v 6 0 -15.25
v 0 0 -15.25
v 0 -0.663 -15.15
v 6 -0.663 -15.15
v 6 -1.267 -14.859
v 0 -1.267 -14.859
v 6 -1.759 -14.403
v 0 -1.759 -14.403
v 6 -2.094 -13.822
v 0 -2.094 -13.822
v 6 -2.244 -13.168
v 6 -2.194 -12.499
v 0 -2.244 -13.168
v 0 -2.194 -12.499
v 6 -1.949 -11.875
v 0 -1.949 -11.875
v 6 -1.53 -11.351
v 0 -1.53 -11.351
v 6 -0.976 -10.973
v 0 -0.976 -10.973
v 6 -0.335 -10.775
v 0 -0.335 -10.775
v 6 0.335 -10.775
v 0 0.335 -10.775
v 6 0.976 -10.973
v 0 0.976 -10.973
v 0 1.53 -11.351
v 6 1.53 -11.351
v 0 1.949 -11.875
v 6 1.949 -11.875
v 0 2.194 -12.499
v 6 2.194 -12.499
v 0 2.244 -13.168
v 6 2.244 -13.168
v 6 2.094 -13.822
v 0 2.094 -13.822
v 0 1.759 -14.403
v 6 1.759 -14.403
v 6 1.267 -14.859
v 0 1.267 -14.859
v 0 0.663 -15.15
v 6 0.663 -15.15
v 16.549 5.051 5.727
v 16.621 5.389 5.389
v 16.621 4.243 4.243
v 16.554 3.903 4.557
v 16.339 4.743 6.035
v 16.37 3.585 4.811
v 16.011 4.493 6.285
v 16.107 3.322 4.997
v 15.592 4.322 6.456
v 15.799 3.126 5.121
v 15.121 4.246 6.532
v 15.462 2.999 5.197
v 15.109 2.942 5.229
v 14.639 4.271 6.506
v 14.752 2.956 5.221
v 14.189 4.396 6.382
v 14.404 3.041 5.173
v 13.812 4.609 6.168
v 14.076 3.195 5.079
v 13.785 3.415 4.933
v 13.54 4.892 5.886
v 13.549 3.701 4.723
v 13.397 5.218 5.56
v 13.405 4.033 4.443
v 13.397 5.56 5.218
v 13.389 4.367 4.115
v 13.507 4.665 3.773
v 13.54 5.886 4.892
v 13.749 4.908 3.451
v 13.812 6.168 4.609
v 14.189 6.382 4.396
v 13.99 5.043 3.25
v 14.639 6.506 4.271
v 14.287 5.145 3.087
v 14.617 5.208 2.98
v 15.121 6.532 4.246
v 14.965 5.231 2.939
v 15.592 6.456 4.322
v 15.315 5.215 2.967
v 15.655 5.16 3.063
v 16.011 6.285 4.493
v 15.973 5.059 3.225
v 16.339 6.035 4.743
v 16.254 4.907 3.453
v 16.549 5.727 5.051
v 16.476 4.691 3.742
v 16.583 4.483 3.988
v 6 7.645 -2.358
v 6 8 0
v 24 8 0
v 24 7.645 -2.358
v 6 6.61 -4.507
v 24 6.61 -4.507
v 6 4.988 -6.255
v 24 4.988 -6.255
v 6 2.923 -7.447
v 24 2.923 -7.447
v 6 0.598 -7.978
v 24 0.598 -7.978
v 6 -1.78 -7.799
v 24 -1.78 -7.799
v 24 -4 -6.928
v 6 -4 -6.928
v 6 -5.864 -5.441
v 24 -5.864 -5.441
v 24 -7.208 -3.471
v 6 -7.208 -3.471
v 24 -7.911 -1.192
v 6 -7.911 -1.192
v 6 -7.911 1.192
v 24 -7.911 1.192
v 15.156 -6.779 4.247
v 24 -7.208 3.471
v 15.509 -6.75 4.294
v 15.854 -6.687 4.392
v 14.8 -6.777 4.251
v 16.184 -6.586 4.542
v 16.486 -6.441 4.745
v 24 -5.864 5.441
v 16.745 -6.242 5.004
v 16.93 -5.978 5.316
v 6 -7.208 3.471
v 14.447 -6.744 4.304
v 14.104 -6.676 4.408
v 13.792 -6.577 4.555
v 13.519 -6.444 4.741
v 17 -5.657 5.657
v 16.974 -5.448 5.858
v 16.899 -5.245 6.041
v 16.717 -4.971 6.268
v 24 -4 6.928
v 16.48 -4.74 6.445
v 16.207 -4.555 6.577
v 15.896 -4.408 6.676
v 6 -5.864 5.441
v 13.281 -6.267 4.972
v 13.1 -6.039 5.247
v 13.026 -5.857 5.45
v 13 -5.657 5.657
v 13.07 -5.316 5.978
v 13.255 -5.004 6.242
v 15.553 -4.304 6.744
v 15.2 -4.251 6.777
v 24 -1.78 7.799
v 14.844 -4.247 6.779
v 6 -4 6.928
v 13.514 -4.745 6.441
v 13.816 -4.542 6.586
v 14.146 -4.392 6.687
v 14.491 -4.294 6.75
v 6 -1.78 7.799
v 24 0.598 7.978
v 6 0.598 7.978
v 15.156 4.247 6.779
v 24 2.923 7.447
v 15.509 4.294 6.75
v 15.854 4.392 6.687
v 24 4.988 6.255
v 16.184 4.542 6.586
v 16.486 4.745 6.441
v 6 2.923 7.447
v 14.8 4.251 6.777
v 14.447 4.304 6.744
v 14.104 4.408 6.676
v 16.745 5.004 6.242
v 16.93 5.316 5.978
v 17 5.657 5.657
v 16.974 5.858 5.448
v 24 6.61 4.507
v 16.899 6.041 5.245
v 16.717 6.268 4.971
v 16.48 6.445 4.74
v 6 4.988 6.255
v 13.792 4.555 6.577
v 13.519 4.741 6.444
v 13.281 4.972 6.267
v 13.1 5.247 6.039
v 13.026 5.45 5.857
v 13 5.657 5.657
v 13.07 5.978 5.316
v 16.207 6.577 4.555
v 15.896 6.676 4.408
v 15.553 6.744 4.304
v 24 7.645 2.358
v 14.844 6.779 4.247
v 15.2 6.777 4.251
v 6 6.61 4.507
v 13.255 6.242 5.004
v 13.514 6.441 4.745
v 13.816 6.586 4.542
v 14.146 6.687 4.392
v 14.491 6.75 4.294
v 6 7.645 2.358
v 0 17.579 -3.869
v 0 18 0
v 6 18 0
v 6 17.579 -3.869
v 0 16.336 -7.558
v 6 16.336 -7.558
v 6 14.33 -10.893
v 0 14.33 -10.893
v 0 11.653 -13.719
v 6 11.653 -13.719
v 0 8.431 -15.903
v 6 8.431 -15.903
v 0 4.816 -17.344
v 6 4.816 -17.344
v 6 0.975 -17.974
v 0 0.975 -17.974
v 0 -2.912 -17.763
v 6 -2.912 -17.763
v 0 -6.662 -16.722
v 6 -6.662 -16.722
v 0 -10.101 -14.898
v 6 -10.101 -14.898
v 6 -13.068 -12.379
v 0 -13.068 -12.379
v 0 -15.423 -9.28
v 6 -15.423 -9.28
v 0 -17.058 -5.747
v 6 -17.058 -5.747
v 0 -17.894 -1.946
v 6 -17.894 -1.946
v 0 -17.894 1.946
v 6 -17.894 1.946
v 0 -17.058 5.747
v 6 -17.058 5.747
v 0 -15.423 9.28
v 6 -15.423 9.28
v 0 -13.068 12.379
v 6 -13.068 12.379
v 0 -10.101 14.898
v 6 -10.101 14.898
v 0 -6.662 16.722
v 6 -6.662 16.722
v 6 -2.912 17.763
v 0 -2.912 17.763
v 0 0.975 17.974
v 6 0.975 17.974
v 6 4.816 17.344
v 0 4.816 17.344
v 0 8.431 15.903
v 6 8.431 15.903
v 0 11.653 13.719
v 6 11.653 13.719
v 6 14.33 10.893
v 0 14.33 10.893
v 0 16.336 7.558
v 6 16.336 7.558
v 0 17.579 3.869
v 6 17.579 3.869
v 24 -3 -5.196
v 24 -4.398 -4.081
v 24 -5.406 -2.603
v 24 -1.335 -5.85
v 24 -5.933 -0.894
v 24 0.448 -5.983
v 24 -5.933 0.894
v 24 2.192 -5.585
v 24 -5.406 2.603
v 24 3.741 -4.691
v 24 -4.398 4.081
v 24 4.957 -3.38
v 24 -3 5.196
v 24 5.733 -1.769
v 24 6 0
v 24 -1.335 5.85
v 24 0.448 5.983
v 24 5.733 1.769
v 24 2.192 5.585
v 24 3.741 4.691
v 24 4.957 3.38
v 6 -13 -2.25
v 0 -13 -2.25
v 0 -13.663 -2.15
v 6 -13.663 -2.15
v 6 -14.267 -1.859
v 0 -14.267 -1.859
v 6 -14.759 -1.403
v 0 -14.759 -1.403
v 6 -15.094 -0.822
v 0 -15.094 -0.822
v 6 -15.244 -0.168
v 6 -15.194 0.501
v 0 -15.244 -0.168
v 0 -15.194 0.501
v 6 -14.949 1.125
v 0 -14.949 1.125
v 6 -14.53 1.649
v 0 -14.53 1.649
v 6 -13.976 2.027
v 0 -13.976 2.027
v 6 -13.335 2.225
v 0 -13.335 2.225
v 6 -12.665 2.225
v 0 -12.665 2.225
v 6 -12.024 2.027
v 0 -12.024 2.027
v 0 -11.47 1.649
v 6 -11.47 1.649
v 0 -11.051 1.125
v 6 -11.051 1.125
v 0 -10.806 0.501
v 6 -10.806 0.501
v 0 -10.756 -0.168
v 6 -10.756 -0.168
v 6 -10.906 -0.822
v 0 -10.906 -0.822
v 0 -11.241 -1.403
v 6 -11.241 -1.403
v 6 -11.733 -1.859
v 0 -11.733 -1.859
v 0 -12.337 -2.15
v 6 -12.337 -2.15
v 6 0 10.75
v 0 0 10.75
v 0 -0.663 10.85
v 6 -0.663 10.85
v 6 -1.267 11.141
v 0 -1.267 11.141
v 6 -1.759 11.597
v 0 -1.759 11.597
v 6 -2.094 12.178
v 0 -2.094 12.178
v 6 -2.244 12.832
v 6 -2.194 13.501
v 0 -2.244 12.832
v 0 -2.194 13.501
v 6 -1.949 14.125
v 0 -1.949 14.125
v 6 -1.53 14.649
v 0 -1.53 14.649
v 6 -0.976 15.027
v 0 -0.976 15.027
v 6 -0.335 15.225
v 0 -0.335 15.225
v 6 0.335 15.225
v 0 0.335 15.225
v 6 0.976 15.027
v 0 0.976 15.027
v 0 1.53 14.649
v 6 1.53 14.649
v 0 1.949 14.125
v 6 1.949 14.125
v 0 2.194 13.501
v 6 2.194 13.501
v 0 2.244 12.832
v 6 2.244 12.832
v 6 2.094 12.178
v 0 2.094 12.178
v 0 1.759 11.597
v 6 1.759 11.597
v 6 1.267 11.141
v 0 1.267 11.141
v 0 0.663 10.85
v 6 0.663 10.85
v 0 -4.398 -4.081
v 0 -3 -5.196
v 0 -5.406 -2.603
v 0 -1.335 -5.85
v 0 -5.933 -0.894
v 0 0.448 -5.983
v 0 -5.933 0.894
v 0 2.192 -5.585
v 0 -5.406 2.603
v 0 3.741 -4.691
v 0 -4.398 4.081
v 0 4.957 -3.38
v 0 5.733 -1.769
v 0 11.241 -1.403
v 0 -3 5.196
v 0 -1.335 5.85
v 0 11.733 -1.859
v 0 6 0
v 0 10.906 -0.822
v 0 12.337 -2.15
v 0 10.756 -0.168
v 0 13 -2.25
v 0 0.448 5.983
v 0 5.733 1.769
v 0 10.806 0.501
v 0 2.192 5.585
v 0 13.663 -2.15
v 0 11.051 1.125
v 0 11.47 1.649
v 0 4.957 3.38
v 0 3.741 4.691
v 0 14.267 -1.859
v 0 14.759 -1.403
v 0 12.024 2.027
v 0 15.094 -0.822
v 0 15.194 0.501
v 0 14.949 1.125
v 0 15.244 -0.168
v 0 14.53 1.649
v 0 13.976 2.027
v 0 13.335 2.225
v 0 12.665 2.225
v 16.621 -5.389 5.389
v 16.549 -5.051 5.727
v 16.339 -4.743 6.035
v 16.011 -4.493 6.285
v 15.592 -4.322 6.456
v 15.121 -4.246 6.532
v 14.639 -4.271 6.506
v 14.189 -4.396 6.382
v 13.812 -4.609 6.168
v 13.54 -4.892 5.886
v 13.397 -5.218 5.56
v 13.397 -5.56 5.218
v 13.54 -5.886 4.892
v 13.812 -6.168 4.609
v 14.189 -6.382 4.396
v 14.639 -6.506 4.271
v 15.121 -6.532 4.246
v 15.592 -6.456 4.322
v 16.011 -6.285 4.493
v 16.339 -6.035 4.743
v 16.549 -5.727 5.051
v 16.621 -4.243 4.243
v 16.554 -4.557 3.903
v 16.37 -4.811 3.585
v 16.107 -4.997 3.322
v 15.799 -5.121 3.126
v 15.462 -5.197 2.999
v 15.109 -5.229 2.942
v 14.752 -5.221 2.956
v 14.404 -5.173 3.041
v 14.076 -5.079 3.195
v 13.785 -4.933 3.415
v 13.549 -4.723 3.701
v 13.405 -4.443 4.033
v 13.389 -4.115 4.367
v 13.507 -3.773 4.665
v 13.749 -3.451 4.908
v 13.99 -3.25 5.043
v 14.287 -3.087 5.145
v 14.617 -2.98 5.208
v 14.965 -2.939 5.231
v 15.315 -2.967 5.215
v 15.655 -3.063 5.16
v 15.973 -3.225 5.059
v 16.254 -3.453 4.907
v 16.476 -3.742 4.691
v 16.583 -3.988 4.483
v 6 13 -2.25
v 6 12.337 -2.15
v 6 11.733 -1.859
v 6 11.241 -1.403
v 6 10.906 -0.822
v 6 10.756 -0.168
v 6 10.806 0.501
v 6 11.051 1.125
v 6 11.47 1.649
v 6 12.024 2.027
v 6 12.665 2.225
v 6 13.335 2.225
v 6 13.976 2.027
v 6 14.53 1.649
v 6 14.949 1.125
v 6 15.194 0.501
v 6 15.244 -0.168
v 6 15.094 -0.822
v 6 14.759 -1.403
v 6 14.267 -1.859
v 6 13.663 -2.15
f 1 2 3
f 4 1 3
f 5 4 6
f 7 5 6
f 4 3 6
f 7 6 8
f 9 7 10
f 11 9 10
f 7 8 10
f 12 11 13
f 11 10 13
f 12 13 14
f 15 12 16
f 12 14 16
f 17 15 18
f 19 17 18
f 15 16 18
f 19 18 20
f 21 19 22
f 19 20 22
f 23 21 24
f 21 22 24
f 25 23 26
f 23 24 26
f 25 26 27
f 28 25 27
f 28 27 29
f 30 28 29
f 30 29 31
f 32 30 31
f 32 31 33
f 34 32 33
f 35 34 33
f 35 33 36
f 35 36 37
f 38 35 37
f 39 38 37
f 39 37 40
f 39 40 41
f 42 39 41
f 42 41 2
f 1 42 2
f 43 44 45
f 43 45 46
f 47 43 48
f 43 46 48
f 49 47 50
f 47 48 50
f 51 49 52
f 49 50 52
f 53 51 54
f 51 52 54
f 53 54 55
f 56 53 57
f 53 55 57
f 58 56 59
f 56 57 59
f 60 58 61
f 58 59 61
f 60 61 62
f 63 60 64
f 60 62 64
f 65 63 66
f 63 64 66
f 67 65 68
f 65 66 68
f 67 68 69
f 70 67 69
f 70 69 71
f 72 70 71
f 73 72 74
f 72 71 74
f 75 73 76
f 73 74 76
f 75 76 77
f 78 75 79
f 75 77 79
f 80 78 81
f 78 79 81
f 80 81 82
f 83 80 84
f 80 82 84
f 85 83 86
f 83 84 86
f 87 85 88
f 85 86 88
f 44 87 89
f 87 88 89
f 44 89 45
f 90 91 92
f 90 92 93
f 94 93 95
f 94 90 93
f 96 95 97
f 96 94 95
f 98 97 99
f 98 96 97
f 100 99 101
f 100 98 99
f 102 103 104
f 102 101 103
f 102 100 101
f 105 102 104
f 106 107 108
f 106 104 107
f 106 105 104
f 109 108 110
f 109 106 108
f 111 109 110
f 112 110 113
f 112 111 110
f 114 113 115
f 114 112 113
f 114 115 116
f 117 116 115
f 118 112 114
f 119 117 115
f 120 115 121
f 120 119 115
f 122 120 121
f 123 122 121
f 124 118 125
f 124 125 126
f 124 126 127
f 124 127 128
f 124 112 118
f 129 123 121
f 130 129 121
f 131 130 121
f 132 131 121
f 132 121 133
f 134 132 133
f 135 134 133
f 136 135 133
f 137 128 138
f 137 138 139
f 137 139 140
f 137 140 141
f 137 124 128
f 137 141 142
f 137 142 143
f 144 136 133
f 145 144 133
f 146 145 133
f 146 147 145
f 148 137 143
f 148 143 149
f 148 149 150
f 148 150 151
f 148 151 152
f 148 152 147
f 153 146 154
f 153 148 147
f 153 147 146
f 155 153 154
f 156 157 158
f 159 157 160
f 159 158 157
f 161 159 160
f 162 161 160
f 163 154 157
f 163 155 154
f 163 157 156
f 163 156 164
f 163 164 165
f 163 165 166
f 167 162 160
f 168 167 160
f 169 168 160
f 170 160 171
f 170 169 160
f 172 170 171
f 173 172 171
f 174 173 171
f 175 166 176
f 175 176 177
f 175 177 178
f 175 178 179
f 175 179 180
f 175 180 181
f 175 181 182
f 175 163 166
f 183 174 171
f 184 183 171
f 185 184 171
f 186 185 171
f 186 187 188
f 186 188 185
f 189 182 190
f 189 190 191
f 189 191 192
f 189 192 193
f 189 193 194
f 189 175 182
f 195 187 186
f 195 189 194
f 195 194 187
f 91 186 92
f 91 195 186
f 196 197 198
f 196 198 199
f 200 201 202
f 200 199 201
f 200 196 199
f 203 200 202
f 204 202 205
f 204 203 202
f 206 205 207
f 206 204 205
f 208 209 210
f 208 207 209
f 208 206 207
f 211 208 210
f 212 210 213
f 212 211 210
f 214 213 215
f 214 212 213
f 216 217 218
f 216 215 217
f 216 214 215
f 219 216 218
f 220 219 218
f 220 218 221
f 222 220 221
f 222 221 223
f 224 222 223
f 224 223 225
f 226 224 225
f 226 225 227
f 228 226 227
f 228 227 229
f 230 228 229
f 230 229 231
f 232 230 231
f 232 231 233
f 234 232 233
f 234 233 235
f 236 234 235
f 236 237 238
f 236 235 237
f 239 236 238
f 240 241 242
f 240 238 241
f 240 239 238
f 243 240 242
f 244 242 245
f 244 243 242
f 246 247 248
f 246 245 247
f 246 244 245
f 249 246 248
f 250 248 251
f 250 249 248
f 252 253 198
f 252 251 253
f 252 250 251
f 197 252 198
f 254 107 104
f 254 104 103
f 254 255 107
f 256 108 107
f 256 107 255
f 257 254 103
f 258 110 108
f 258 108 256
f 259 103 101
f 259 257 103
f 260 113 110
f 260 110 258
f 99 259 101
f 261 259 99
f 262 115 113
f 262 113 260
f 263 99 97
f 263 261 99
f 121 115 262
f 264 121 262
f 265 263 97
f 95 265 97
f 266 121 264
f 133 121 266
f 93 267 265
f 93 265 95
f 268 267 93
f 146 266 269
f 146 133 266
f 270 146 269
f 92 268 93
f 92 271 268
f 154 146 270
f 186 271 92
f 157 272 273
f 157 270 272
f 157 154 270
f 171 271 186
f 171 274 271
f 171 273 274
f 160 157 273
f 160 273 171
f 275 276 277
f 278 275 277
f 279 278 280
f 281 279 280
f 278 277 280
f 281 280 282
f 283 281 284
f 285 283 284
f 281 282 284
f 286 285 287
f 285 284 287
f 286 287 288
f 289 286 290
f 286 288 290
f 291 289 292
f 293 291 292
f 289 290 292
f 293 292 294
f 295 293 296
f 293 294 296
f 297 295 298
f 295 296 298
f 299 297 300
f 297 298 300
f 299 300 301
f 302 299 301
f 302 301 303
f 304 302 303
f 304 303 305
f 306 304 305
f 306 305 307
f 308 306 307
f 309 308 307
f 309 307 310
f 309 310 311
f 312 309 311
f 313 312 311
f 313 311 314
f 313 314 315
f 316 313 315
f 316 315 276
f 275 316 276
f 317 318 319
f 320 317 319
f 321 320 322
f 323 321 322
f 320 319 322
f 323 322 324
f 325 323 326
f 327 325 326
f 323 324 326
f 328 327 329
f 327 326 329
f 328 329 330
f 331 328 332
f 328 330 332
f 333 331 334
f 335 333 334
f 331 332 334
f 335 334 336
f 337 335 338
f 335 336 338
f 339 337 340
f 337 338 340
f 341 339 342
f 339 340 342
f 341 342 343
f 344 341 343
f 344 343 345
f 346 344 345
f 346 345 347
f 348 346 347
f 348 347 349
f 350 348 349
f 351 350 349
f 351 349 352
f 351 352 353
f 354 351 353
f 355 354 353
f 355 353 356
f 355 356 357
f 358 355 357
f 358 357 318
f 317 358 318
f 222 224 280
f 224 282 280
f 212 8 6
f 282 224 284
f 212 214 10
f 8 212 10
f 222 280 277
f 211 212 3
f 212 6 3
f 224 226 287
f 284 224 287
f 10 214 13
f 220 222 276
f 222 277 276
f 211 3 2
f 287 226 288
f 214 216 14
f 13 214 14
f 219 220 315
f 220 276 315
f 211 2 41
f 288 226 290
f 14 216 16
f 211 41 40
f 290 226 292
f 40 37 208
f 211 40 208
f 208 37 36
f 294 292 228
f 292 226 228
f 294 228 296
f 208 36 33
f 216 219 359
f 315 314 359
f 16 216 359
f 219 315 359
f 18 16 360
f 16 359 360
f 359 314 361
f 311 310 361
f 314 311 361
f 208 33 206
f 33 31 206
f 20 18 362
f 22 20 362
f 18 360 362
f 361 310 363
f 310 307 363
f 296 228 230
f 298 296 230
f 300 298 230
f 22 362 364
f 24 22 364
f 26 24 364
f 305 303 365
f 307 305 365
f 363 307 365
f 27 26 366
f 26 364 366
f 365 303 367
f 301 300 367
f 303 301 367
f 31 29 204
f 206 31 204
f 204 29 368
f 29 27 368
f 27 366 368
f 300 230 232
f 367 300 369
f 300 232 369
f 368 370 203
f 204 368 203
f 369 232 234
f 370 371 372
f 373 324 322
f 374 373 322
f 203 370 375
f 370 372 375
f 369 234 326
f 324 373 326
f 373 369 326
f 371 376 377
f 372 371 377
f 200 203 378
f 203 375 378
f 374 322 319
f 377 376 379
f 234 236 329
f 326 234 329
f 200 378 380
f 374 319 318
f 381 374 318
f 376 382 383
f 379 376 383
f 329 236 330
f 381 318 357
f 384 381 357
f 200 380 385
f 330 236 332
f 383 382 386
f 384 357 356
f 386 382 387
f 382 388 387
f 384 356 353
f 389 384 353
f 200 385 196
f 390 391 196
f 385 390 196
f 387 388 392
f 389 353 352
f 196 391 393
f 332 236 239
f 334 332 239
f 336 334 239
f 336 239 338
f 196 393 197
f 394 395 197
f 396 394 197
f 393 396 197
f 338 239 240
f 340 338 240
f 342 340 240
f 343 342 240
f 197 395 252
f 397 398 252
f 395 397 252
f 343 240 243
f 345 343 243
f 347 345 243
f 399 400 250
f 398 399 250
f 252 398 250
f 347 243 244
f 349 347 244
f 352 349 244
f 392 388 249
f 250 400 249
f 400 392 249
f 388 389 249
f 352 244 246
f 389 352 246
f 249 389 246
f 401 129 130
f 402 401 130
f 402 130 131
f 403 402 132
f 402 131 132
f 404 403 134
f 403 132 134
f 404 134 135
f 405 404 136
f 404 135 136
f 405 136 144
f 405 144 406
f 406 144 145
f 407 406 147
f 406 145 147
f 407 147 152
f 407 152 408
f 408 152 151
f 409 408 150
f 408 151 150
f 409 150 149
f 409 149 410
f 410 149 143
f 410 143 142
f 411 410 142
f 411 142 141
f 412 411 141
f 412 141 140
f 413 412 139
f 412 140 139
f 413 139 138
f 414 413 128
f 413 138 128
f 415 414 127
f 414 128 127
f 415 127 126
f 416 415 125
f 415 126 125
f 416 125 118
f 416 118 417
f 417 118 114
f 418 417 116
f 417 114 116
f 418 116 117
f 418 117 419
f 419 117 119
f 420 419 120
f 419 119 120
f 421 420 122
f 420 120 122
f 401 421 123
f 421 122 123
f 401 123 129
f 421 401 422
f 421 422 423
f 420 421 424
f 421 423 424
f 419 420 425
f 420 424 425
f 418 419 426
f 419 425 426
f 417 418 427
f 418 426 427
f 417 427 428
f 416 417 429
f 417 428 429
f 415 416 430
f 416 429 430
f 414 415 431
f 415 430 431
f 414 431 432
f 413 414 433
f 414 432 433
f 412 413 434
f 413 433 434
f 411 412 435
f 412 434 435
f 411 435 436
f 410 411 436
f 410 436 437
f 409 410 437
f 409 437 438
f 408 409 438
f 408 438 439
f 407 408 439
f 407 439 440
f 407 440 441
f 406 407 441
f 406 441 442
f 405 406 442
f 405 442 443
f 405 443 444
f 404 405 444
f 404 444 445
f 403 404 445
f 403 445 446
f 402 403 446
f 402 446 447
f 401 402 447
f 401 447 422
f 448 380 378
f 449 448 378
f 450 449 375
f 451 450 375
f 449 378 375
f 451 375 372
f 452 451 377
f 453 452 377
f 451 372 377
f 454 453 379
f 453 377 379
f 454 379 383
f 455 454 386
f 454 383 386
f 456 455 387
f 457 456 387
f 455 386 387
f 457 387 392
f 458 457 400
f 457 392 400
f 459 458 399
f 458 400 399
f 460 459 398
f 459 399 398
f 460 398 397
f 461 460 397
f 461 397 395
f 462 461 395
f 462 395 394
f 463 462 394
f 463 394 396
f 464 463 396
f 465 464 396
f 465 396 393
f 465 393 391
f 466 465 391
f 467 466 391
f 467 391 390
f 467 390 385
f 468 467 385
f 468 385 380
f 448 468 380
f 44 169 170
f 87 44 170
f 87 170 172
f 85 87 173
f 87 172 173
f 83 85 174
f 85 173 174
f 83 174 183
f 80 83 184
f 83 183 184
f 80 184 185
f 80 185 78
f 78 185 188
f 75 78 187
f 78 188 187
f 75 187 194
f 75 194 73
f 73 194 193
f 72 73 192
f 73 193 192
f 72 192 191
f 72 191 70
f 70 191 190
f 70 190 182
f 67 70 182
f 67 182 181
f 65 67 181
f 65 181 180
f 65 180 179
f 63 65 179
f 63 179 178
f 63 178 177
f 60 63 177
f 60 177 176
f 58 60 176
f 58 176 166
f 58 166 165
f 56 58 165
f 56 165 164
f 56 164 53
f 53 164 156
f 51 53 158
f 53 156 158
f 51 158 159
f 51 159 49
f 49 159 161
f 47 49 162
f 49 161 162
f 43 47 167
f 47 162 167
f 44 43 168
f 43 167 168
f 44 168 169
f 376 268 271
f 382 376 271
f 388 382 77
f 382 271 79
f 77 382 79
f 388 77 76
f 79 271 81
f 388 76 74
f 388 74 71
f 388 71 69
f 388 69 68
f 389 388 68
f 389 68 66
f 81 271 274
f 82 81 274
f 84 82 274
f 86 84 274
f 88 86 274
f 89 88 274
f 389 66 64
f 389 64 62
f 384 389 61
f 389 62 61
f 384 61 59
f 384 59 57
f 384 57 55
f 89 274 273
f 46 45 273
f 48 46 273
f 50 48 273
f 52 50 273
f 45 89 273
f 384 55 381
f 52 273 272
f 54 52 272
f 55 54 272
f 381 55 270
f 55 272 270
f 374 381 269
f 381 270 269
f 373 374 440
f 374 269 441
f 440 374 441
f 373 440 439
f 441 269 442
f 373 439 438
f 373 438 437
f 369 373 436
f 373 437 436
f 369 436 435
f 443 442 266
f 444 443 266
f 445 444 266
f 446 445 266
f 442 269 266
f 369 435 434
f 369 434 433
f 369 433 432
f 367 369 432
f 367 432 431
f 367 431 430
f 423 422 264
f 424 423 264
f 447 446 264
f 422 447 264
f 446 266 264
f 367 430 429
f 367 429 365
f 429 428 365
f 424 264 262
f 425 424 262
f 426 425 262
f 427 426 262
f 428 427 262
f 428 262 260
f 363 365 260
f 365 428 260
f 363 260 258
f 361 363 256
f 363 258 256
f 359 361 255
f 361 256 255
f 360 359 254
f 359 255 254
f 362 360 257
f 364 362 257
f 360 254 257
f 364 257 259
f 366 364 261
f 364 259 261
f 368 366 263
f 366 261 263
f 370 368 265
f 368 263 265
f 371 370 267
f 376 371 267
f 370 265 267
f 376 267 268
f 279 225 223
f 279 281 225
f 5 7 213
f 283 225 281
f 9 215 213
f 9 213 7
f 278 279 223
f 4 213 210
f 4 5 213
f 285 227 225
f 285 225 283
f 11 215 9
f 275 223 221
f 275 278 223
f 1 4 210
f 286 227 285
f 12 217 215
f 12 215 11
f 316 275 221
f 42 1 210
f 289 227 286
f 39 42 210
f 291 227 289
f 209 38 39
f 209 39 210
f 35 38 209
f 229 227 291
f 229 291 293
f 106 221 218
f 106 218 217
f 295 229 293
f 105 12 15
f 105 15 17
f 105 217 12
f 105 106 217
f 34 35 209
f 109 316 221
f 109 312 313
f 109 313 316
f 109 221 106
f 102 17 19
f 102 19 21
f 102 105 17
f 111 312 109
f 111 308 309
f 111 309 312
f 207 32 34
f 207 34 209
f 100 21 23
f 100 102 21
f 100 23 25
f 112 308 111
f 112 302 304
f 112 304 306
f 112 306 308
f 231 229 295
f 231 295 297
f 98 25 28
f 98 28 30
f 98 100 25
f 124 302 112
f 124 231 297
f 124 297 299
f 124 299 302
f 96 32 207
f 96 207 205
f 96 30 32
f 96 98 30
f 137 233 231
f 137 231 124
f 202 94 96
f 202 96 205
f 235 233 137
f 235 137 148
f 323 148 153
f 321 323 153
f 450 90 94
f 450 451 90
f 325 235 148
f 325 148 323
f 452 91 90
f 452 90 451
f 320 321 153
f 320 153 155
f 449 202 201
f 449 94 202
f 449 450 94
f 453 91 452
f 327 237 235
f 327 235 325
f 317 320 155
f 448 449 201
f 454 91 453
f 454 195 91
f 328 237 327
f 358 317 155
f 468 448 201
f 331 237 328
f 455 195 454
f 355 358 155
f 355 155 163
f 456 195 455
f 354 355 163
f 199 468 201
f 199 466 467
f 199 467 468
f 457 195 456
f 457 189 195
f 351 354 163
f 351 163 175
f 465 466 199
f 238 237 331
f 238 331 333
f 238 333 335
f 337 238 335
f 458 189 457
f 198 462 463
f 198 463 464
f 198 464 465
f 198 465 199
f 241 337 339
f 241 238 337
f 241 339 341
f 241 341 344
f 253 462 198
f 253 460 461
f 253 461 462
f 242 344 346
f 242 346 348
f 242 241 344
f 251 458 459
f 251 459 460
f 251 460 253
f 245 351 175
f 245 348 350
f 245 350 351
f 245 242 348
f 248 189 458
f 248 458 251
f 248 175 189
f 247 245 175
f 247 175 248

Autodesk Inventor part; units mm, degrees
sketch "Sketch_1" plane through (0, 0, 0) normal (0, 0, 1) x (1, 0, 0)
  line L0 (24, 0) -> (0, 0)
  line L1 (0, 18) -> (0, 6)
  line L2 (0, 6) -> (24, 6)
  line L3 (24, 6) -> (24, 8)
  line L4 (24, 8) -> (6, 8)
  line L5 (6, 8) -> (6, 18)
  line L6 (6, 18) -> (0, 18)
revolve "Revolution1" add sketch "Sketch_1" angle 360 about axis through (24, 0, 0) along (1, 0, 0)
sketch "Sketch_3" plane through (0, 0, 0) normal (0, -0.7071, 0.7071) x (1, 0, 0)
  line L0 (15, 5.5) -> (15, 8)
  line L1 (15, 8) -> (17, 8)
  line L2 (17, 8) -> (16.621, 7.621)
  line L3 (16.621, 7.621) -> (16.621, 5.5)
  line L4 (16.621, 5.5) -> (15, 5.5)
  line L5 (15, 5.5) -> (15, 8)
revolve "Revolution2" cut sketch "Sketch_3" angle 360 about axis through (15, 3.8891, 3.8891) along (0, -0.7071, -0.7071)
thread "Thread1" size "M4x0.7" class "6H" standard "ISO Metric profile" length 2.121
sketch "Sketch3" plane through (6, 0, 0) normal (1, 0, 0) x (0, 0, -1)
  point P0 (0, 13)
hole "Hole1" at (6, 13, 0) direction (-1, 0, 0) diameter 4.5 depth 6
sketch "Sketch4" plane through (6, 0, 0) normal (1, 0, 0) x (0, 0, -1)
  point P0 (0, -13)
hole "Hole2" at (6, -13, 0) direction (-1, 0, 0) diameter 4.5 depth 6
sketch "Sketch5" plane through (6, 0, 0) normal (1, 0, 0) x (0, 0, -1)
  point P0 (-13, 0)
hole "Hole3" at (6, 0, 13) direction (-1, 0, 0) diameter 4.5 depth 6
sketch "Sketch6" plane through (6, 0, 0) normal (1, 0, 0) x (0, 0, -1)
  point P0 (13, 0)
hole "Hole4" at (6, 0, -13) direction (-1, 0, 0) diameter 4.5 depth 6
sketch "Sketch_2" plane through (0, 0, 0) normal (0, -0.7071, -0.7071) x (1, 0, 0)
  line L0 (15, 5.5) -> (15, 8)
  line L1 (15, 8) -> (17, 8)
  line L2 (17, 8) -> (16.621, 7.621)
  line L3 (16.621, 7.621) -> (16.621, 5.5)
  line L4 (16.621, 5.5) -> (15, 5.5)
  line L5 (15, 5.5) -> (15, 8)
revolve "Revolution3" cut sketch "Sketch_2" angle 360 about axis through (15, -3.8891, 3.8891) along (0, 0.7071, -0.7071)
thread "Thread2" size "M4x0.7" class "6H" standard "ISO Metric profile" length 2.121
ref_plane "to_screw1_XY" through (15, 4.2426, 4.2426) normal (0, 0.7071, 0.7071) x (1, 0, 0)
ref_plane "to_screw1_YZ" through (15, 4.2426, 4.2426) normal (1, 0, 0) x (0, 0.7071, -0.7071)
ref_plane "to_screw1_ZX" through (15, 4.2426, 4.2426) normal (0, 0.7071, -0.7071) x (0, 0.7071, 0.7071)
ref_plane "to_screw2_XY" through (15, -4.2426, 4.2426) normal (0, -0.7071, 0.7071) x (1, 0, 0)
ref_plane "to_screw2_YZ" through (15, -4.2426, 4.2426) normal (1, 0, 0) x (0, 0.7071, 0.7071)
ref_plane "to_screw2_ZX" through (15, -4.2426, 4.2426) normal (0, 0.7071, 0.7071) x (0, -0.7071, 0.7071)
properties part number "BTHR12-MB_b"
